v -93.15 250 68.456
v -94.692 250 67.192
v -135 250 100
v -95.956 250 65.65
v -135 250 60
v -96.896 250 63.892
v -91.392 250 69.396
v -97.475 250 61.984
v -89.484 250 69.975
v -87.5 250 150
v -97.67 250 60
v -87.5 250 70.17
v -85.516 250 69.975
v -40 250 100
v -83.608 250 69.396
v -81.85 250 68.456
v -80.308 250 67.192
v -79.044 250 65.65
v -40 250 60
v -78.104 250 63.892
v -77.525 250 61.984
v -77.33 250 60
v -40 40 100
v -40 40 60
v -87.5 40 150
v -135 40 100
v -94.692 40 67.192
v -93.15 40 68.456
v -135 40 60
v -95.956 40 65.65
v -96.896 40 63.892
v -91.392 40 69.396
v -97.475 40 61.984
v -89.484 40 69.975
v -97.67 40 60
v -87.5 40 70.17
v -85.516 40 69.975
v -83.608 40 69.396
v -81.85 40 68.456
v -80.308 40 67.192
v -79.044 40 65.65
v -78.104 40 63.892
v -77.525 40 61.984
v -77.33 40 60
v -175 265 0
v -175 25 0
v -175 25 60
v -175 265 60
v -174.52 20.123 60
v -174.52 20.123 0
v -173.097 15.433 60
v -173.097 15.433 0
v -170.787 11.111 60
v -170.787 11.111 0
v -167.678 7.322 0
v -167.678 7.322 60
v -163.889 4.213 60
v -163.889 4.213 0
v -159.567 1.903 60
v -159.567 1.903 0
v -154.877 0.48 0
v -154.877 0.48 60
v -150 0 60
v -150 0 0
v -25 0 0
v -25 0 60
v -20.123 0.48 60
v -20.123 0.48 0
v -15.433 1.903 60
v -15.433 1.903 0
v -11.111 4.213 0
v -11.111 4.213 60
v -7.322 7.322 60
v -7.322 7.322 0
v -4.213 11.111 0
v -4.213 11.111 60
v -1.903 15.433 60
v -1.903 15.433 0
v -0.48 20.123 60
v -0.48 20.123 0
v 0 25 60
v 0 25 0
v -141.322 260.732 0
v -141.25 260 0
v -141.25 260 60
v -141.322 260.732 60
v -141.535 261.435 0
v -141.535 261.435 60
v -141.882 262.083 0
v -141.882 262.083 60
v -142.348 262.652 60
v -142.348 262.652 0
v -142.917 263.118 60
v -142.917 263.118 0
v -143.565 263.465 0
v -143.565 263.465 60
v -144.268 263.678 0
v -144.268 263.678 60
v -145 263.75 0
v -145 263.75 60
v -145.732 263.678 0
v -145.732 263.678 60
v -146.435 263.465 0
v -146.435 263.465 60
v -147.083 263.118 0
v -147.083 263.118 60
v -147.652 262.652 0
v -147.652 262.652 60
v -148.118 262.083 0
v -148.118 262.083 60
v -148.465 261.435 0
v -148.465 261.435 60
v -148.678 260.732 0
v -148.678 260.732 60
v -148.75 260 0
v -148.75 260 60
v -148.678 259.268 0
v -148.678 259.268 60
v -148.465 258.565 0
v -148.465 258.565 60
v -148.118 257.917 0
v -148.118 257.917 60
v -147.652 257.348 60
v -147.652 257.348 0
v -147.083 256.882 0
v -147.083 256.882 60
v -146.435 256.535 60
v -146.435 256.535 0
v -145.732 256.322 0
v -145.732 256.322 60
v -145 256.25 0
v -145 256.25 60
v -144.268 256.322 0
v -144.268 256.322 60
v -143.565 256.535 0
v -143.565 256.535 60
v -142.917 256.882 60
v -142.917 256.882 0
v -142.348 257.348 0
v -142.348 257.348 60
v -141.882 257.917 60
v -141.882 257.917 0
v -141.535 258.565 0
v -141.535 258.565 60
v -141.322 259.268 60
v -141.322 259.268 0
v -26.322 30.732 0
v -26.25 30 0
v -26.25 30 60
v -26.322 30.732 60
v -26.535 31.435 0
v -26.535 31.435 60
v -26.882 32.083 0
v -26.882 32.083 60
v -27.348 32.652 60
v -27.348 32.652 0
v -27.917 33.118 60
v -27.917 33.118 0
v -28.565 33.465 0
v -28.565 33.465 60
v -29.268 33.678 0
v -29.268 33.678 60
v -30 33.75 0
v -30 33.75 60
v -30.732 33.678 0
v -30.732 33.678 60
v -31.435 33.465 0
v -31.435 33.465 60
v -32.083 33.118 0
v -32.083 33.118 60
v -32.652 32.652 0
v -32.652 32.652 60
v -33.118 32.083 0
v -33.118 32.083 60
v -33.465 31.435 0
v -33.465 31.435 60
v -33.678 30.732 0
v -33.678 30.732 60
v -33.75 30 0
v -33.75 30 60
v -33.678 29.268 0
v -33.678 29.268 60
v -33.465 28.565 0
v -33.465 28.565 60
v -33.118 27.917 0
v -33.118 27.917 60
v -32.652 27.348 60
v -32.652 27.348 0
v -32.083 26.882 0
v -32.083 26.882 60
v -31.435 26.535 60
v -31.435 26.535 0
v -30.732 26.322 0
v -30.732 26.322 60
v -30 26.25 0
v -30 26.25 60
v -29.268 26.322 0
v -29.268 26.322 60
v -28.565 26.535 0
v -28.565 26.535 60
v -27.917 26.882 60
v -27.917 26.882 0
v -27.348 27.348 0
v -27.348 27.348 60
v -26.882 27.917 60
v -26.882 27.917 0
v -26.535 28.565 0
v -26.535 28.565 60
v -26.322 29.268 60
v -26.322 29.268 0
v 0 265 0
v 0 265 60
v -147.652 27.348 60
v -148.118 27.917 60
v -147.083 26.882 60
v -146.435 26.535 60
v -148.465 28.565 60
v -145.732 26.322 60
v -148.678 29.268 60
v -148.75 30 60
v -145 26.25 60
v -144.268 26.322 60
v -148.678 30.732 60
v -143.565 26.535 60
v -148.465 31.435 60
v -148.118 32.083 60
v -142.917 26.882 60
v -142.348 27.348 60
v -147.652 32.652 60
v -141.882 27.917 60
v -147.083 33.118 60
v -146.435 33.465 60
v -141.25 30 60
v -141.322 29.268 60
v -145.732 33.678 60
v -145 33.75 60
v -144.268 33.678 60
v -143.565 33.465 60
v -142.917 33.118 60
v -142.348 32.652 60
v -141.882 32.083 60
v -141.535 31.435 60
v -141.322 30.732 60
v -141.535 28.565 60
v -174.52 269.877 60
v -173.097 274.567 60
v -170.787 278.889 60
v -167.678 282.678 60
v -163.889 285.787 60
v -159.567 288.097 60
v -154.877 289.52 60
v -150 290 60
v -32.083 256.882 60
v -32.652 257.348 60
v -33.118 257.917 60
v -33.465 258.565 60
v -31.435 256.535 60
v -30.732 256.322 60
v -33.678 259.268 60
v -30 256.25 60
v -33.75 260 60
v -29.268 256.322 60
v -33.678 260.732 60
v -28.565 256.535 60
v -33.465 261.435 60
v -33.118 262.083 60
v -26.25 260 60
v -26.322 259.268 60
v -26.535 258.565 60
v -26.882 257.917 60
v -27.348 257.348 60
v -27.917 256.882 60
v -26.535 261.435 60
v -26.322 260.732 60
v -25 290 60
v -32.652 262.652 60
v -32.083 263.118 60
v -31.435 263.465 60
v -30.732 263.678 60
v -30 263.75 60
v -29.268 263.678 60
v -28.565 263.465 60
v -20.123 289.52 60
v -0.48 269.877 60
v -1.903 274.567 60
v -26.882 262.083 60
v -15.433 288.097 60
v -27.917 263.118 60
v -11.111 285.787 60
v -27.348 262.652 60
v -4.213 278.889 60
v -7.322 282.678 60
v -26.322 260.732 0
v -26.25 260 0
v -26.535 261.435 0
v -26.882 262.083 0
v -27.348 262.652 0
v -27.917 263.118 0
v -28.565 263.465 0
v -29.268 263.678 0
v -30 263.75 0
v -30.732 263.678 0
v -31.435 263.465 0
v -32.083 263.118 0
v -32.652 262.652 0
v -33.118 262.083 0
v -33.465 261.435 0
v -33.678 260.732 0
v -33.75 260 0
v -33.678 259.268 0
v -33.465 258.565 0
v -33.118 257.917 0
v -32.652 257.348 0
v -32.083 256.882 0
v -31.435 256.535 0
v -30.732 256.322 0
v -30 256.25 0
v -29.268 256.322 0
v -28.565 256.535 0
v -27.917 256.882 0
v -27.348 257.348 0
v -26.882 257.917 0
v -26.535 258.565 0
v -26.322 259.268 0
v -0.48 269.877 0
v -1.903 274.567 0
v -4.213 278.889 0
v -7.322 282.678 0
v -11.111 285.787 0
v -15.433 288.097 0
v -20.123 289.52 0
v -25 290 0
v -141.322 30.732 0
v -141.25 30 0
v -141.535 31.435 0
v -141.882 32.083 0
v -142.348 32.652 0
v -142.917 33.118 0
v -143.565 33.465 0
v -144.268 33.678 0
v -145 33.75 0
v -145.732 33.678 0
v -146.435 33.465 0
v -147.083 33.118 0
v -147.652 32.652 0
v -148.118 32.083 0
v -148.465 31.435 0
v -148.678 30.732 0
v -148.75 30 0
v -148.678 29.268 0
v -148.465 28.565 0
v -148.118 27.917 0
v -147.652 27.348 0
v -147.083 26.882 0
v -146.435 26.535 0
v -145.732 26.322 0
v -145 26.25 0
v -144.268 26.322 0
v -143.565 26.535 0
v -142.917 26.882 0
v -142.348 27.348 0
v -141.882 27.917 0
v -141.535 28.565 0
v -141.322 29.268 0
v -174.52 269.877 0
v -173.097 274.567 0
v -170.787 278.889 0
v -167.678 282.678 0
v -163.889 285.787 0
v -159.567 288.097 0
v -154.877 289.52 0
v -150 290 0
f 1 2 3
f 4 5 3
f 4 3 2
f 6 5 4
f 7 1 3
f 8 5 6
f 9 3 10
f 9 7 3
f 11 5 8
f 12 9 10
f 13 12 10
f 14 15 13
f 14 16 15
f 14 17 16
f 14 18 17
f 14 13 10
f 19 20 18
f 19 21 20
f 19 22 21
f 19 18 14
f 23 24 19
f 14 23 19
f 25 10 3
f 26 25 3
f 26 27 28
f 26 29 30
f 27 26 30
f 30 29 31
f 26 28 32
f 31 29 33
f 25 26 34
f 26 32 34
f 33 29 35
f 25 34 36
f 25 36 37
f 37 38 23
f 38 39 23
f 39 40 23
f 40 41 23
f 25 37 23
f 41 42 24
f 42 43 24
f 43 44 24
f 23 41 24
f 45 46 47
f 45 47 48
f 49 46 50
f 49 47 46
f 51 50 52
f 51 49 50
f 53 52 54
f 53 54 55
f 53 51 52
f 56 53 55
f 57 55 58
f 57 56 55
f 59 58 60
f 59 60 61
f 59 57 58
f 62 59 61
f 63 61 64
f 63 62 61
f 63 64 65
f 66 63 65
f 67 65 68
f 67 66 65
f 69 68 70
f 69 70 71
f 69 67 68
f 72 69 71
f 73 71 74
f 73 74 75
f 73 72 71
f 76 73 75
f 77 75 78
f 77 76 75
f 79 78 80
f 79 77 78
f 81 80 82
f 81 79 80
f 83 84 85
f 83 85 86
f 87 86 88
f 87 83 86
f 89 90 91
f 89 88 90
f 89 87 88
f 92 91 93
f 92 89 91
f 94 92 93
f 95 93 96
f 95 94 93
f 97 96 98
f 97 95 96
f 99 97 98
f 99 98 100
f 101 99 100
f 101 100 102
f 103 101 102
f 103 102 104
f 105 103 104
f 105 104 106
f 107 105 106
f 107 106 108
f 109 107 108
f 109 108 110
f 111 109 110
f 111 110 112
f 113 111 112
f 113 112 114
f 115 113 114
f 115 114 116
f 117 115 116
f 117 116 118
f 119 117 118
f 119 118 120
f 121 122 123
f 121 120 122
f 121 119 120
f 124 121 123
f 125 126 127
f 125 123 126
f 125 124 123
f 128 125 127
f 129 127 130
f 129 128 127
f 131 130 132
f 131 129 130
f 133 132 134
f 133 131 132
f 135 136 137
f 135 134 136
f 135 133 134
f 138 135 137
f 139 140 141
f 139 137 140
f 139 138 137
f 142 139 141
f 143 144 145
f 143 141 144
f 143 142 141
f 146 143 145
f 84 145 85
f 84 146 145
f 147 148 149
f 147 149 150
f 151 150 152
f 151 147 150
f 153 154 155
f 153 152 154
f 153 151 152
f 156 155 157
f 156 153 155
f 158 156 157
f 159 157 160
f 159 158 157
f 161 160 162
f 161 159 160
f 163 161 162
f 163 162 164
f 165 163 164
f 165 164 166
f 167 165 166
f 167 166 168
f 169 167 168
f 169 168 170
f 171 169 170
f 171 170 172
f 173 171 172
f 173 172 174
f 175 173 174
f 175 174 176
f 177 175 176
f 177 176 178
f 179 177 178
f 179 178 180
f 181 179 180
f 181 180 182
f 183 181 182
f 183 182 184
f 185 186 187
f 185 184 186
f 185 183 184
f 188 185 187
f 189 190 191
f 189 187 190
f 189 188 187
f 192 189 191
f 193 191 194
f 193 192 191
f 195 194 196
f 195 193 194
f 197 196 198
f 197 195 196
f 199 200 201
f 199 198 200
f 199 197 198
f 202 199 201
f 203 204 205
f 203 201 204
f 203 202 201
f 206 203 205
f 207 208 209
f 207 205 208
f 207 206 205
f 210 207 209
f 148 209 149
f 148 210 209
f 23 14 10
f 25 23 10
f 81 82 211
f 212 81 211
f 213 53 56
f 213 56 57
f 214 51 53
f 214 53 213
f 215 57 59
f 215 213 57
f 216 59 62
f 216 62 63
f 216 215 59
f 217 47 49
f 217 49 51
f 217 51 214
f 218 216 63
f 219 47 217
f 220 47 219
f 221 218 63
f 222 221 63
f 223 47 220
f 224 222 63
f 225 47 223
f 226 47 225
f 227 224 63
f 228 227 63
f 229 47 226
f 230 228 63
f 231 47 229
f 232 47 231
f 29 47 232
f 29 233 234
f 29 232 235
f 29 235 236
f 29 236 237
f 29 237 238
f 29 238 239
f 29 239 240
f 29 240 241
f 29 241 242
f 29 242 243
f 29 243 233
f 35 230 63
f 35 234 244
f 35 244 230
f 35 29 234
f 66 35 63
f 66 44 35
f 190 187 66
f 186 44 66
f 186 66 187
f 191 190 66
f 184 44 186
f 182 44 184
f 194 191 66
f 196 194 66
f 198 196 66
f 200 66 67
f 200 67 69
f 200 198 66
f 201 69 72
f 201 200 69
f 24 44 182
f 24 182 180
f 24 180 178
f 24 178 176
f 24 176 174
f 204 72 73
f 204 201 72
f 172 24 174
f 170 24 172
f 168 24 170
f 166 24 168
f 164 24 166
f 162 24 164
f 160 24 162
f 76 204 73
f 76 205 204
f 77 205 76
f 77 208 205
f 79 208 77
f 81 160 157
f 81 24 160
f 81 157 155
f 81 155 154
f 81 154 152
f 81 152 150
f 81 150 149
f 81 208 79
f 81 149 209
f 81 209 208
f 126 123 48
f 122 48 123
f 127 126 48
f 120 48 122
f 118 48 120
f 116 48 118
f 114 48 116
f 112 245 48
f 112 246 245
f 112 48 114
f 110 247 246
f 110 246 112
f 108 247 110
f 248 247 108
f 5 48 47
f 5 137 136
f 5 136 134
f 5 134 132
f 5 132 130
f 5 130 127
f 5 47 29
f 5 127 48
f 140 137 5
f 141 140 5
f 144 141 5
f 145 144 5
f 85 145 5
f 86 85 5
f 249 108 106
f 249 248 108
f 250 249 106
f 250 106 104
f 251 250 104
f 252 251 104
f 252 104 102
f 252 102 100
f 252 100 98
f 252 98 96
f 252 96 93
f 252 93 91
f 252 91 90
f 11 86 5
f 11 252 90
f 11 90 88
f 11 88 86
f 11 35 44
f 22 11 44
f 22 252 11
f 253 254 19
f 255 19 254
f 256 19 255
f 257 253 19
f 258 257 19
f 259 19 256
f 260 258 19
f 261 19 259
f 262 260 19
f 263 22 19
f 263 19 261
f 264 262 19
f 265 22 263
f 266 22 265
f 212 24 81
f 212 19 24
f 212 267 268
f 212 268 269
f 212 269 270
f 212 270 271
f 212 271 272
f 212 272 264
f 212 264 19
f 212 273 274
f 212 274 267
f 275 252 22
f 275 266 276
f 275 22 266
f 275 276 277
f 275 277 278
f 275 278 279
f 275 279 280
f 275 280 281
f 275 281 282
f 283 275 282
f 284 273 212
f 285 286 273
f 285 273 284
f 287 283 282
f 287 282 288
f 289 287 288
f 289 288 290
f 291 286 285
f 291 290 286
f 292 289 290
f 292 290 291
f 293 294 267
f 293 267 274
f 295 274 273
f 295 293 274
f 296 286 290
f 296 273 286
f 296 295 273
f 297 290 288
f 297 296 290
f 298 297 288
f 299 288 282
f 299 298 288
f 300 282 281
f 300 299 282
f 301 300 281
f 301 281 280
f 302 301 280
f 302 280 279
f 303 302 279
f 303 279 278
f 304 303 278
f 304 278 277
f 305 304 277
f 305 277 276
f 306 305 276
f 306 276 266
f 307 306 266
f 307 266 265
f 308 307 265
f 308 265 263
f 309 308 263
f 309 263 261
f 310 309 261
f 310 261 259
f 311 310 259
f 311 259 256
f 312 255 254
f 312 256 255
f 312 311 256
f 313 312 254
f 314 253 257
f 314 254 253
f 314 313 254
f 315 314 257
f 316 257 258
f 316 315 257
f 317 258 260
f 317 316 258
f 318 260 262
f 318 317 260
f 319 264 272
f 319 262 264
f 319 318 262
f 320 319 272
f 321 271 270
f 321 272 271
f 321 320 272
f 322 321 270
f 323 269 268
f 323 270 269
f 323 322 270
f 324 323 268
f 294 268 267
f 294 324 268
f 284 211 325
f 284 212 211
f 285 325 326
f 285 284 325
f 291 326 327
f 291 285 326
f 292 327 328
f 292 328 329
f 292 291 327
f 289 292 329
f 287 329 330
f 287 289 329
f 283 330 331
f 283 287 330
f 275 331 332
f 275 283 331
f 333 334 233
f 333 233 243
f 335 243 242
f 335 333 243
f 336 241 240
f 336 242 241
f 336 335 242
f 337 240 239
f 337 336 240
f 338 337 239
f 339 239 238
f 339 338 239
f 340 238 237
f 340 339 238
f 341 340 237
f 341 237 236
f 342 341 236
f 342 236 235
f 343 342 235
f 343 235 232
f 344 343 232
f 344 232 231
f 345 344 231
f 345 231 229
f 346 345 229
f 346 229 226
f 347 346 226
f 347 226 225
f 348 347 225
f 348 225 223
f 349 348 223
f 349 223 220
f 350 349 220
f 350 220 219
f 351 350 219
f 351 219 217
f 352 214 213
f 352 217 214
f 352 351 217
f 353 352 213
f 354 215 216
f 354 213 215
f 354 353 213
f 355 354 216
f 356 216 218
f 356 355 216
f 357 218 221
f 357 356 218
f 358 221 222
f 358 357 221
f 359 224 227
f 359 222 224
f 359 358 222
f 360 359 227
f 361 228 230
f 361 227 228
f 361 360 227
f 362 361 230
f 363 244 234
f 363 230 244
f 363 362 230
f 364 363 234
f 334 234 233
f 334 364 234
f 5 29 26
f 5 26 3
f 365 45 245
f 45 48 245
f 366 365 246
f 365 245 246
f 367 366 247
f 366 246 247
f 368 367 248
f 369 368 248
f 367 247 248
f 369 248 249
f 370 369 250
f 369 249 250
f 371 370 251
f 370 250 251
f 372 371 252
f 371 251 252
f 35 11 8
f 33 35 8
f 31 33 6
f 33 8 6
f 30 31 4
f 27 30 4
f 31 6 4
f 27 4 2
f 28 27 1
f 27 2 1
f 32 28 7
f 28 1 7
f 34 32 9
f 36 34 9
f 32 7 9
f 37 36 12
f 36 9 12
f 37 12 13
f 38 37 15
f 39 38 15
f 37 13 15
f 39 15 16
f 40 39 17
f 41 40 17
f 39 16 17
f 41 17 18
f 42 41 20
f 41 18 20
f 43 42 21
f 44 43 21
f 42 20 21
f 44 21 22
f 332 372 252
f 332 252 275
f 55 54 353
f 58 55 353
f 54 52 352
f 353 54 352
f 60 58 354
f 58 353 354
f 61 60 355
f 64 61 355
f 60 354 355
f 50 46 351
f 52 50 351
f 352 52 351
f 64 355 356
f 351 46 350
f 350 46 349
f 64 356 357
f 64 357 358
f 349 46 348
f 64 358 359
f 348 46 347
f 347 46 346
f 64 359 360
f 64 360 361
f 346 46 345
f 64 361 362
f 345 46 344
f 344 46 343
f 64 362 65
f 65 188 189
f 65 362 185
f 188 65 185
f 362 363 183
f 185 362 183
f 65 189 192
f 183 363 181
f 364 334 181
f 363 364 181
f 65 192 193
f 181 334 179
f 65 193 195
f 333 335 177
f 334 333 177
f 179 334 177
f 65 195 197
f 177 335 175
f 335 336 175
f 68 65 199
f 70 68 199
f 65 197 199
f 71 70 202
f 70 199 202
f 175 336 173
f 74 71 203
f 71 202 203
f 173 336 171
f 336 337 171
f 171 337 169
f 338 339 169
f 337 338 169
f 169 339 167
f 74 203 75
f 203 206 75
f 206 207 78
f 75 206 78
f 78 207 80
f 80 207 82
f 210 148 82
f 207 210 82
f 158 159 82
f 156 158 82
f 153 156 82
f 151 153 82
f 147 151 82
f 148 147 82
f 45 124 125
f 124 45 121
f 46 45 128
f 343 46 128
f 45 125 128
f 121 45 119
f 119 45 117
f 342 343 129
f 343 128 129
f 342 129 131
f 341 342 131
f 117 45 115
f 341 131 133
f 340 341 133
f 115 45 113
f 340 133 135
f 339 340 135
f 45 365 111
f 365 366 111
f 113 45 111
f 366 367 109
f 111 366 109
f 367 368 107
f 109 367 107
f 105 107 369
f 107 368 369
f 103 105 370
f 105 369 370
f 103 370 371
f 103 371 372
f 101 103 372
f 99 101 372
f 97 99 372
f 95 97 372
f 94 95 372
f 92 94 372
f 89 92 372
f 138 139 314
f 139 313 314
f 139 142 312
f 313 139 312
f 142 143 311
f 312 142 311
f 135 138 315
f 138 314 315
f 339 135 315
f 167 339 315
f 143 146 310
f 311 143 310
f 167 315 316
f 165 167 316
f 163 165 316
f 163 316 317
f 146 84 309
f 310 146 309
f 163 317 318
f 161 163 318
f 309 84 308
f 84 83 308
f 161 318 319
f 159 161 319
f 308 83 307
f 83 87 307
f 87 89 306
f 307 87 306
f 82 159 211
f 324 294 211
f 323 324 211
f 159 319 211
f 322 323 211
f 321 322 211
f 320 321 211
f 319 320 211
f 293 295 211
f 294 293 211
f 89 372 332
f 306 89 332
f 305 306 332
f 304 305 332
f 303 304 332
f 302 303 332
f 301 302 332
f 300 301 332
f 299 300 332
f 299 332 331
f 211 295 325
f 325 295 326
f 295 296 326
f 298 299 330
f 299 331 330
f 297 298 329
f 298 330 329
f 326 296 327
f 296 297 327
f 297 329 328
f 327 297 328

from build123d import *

# Parameters (mm, degrees)
IZIM4_W                     = 175
IZIM4_H                     = 290
Y_KSEKLIK_EKSTR_ZYON5_DEPTH = 60
RADYUS4_R                   = 25
KES_EKSTR_ZYON2_DEPTH       = 344.984011256
KES_EKSTR_ZYON2_DEPTH_BACK  = 344.984011256
IZIM8_R                     = 3.75
IZIM9_W                     = 95
IZIM9_H                     = 210
Y_KSEKLIK_EKSTR_ZYON8_DEPTH = 90
KES_EKSTR_ZYON4_DEPTH       = 341.036762718
KES_EKSTR_ZYON8_DEPTH       = 341.036762718


with BuildPart() as part:
    # Çizim4 → Yükseklik-Ekstrüzyon5 (new body)
    with BuildSketch(Plane.XY):
        with Locations((-87.5, 145)):
            Rectangle(IZIM4_W, IZIM4_H)
    extrude(amount=Y_KSEKLIK_EKSTR_ZYON5_DEPTH)

    # Radyus4
    radyus4_edges = [part.edges().sort_by_distance(p)[0] for p in [
        (0, 0, 30),
        (-175, 0, 30),
        (-175, 290, 30),
        (0, 290, 30),
    ]]
    fillet(radyus4_edges, radius=RADYUS4_R)

    # Çizim8 → Kes-Ekstrüzyon2 (cut, two sides: drawn at the far end of the back side and taken through both)
    with BuildSketch(Plane.XY.offset(60).offset(-KES_EKSTR_ZYON2_DEPTH_BACK)):
        with Locations((-145, 30)):
            Circle(IZIM8_R)
        with Locations((-30, 30)):
            Circle(IZIM8_R)
        with Locations((-145, 260)):
            Circle(IZIM8_R)
        with Locations((-30, 260)):
            Circle(IZIM8_R)
    extrude(amount=KES_EKSTR_ZYON2_DEPTH + KES_EKSTR_ZYON2_DEPTH_BACK, mode=Mode.SUBTRACT)

    # Çizim9 → Yükseklik-Ekstrüzyon8 (add)
    with BuildSketch(Plane.XY.offset(60)):
        with Locations((-87.5, 145)):
            Rectangle(IZIM9_W, IZIM9_H)
    extrude(amount=Y_KSEKLIK_EKSTR_ZYON8_DEPTH)

    # Çizim11 → Kes-Ekstrüzyon4 (cut, through all)
    with BuildSketch(Plane(origin=(0, 250, 0), x_dir=(1, 0, 0), z_dir=(0, 1, 0))):
        Polygon((-40, -100), (-87.5, -150), (-40, -150), align=None)
        Polygon((-87.5, -150), (-135, -100), (-135, -150), align=None)
    extrude(amount=-KES_EKSTR_ZYON4_DEPTH, mode=Mode.SUBTRACT)

    # Çizim16 → Kes-Ekstrüzyon8 (cut, through all)
    with BuildSketch(Plane(origin=(0, 250, 0), x_dir=(1, 0, 0), z_dir=(0, 1, 0))):
        with BuildLine():
            Line((-77.329660293, -60), (-97.670339707, -60))
            ThreePointArc((-97.670339707, -60), (-87.5, -70.170339707), (-77.329660293, -60))
        make_face()
    extrude(amount=-KES_EKSTR_ZYON8_DEPTH, mode=Mode.SUBTRACT)


solid = part.part
